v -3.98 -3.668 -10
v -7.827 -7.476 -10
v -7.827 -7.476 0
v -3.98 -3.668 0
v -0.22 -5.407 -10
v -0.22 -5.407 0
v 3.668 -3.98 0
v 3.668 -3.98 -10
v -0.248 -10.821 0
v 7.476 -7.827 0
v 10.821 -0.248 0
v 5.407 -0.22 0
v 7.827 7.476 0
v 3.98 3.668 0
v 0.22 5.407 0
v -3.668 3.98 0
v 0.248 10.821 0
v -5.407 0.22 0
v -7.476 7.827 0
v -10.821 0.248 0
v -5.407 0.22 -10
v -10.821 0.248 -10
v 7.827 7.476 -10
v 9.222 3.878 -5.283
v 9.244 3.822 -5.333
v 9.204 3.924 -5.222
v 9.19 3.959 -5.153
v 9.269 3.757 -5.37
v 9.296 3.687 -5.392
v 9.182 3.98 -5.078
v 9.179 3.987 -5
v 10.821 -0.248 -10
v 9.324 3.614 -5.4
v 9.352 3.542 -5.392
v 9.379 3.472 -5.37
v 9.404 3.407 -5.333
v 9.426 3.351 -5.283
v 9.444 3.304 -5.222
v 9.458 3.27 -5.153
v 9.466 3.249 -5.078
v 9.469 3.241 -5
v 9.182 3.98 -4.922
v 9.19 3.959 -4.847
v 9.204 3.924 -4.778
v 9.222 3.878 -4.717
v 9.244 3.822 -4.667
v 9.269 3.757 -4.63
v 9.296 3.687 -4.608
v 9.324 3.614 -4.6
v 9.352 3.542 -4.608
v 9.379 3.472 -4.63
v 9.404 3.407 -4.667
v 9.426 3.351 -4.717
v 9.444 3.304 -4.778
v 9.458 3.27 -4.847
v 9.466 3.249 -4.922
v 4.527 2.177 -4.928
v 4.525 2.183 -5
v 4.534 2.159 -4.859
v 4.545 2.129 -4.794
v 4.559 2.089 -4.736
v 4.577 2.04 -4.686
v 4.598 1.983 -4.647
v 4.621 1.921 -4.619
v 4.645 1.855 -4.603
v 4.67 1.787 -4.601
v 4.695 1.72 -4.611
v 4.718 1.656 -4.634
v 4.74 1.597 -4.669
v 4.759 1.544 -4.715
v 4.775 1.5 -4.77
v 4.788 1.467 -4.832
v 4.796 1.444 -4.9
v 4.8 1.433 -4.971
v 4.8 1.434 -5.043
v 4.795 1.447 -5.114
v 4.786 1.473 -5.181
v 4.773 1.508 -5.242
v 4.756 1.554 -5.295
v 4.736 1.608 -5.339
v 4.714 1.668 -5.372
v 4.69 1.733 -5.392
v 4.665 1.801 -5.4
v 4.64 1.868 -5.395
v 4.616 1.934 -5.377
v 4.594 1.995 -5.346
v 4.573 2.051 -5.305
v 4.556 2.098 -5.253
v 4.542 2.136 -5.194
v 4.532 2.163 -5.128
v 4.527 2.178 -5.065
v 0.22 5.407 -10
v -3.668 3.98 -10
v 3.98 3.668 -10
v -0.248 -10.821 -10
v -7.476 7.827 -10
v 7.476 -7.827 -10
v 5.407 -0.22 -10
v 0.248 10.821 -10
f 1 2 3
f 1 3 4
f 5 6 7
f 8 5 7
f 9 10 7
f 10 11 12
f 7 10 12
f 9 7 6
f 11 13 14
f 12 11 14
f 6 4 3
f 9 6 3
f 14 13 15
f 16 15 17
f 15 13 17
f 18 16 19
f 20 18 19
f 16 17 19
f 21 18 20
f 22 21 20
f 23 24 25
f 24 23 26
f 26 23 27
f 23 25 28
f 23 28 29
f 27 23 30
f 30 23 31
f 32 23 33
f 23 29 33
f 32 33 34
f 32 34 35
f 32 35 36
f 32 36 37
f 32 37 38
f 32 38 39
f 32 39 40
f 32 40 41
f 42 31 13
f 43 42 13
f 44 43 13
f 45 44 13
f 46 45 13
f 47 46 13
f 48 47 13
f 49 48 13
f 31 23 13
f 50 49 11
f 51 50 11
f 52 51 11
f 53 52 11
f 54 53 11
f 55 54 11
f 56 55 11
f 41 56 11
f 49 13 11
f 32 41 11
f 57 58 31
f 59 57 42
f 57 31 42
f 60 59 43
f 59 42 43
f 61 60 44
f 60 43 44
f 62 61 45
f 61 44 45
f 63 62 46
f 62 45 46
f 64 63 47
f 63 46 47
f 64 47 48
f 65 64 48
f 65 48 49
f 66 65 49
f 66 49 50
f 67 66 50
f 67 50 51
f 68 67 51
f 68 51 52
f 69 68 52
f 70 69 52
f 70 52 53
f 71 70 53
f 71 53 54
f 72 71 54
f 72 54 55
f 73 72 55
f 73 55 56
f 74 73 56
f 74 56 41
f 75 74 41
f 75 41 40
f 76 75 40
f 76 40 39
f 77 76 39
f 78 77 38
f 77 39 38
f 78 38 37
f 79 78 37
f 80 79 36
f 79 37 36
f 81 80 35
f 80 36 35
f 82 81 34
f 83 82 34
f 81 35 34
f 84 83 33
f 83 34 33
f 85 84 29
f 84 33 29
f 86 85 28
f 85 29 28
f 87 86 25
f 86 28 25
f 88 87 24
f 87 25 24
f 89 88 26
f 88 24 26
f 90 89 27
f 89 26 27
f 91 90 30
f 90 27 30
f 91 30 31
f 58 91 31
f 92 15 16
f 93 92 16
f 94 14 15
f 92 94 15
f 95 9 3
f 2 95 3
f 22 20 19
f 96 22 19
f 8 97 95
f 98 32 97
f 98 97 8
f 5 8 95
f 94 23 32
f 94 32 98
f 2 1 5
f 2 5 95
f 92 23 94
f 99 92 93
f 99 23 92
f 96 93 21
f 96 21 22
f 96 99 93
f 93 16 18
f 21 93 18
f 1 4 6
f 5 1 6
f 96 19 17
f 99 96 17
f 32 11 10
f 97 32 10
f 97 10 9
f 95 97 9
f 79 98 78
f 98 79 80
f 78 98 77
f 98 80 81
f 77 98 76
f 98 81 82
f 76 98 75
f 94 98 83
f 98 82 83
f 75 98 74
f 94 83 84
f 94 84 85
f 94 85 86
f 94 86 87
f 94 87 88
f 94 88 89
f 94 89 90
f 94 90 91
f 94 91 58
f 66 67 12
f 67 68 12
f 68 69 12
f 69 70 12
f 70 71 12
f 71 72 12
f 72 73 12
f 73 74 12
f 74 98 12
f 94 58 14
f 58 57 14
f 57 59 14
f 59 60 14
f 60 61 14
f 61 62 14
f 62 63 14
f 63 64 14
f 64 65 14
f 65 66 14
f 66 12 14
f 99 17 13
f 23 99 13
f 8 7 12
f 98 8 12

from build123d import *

# Parameters (mm, degrees)
BOSS_EXTRUDE1_DEPTH = 10
SKETCH2_R           = 0.4
CUT_EXTRUDE1_DEPTH  = 602


with BuildPart() as part:
    # Sketch1 → Boss-Extrude1 (new body)
    with BuildSketch(Plane.XY):
        Polygon((-3.979511218, -3.667807567), (-0.220407765, -5.407470971), (3.667807567, -3.979511218), (5.407470971, -0.220407765), (3.979511218, 3.667807567), (0.220407765, 5.407470971), (-3.667807567, 3.979511218), (-5.407470971, 0.220407765), (-10.821084843, 0.247811103), (-7.476433561, 7.826891384), (0.247811103, 10.821084843), (7.826891384, 7.476433561), (10.821084843, -0.247811103), (7.476433561, -7.826891384), (-0.247811103, -10.821084843), (-7.826891384, -7.476433561), align=None)
    extrude(amount=-BOSS_EXTRUDE1_DEPTH)

    # Sketch2 → Cut-Extrude1 (cut)
    with BuildSketch(Plane(origin=(9.323988114, 3.614311229, 0), x_dir=(0, 0, -1), z_dir=(0.9323988113551661, 0.361431122876093, 0))):
        with Locations(Location((5, 0, 0), (0, 0, 90))):
            Circle(SKETCH2_R)
    extrude(amount=-CUT_EXTRUDE1_DEPTH, mode=Mode.SUBTRACT)


solid = part.part
